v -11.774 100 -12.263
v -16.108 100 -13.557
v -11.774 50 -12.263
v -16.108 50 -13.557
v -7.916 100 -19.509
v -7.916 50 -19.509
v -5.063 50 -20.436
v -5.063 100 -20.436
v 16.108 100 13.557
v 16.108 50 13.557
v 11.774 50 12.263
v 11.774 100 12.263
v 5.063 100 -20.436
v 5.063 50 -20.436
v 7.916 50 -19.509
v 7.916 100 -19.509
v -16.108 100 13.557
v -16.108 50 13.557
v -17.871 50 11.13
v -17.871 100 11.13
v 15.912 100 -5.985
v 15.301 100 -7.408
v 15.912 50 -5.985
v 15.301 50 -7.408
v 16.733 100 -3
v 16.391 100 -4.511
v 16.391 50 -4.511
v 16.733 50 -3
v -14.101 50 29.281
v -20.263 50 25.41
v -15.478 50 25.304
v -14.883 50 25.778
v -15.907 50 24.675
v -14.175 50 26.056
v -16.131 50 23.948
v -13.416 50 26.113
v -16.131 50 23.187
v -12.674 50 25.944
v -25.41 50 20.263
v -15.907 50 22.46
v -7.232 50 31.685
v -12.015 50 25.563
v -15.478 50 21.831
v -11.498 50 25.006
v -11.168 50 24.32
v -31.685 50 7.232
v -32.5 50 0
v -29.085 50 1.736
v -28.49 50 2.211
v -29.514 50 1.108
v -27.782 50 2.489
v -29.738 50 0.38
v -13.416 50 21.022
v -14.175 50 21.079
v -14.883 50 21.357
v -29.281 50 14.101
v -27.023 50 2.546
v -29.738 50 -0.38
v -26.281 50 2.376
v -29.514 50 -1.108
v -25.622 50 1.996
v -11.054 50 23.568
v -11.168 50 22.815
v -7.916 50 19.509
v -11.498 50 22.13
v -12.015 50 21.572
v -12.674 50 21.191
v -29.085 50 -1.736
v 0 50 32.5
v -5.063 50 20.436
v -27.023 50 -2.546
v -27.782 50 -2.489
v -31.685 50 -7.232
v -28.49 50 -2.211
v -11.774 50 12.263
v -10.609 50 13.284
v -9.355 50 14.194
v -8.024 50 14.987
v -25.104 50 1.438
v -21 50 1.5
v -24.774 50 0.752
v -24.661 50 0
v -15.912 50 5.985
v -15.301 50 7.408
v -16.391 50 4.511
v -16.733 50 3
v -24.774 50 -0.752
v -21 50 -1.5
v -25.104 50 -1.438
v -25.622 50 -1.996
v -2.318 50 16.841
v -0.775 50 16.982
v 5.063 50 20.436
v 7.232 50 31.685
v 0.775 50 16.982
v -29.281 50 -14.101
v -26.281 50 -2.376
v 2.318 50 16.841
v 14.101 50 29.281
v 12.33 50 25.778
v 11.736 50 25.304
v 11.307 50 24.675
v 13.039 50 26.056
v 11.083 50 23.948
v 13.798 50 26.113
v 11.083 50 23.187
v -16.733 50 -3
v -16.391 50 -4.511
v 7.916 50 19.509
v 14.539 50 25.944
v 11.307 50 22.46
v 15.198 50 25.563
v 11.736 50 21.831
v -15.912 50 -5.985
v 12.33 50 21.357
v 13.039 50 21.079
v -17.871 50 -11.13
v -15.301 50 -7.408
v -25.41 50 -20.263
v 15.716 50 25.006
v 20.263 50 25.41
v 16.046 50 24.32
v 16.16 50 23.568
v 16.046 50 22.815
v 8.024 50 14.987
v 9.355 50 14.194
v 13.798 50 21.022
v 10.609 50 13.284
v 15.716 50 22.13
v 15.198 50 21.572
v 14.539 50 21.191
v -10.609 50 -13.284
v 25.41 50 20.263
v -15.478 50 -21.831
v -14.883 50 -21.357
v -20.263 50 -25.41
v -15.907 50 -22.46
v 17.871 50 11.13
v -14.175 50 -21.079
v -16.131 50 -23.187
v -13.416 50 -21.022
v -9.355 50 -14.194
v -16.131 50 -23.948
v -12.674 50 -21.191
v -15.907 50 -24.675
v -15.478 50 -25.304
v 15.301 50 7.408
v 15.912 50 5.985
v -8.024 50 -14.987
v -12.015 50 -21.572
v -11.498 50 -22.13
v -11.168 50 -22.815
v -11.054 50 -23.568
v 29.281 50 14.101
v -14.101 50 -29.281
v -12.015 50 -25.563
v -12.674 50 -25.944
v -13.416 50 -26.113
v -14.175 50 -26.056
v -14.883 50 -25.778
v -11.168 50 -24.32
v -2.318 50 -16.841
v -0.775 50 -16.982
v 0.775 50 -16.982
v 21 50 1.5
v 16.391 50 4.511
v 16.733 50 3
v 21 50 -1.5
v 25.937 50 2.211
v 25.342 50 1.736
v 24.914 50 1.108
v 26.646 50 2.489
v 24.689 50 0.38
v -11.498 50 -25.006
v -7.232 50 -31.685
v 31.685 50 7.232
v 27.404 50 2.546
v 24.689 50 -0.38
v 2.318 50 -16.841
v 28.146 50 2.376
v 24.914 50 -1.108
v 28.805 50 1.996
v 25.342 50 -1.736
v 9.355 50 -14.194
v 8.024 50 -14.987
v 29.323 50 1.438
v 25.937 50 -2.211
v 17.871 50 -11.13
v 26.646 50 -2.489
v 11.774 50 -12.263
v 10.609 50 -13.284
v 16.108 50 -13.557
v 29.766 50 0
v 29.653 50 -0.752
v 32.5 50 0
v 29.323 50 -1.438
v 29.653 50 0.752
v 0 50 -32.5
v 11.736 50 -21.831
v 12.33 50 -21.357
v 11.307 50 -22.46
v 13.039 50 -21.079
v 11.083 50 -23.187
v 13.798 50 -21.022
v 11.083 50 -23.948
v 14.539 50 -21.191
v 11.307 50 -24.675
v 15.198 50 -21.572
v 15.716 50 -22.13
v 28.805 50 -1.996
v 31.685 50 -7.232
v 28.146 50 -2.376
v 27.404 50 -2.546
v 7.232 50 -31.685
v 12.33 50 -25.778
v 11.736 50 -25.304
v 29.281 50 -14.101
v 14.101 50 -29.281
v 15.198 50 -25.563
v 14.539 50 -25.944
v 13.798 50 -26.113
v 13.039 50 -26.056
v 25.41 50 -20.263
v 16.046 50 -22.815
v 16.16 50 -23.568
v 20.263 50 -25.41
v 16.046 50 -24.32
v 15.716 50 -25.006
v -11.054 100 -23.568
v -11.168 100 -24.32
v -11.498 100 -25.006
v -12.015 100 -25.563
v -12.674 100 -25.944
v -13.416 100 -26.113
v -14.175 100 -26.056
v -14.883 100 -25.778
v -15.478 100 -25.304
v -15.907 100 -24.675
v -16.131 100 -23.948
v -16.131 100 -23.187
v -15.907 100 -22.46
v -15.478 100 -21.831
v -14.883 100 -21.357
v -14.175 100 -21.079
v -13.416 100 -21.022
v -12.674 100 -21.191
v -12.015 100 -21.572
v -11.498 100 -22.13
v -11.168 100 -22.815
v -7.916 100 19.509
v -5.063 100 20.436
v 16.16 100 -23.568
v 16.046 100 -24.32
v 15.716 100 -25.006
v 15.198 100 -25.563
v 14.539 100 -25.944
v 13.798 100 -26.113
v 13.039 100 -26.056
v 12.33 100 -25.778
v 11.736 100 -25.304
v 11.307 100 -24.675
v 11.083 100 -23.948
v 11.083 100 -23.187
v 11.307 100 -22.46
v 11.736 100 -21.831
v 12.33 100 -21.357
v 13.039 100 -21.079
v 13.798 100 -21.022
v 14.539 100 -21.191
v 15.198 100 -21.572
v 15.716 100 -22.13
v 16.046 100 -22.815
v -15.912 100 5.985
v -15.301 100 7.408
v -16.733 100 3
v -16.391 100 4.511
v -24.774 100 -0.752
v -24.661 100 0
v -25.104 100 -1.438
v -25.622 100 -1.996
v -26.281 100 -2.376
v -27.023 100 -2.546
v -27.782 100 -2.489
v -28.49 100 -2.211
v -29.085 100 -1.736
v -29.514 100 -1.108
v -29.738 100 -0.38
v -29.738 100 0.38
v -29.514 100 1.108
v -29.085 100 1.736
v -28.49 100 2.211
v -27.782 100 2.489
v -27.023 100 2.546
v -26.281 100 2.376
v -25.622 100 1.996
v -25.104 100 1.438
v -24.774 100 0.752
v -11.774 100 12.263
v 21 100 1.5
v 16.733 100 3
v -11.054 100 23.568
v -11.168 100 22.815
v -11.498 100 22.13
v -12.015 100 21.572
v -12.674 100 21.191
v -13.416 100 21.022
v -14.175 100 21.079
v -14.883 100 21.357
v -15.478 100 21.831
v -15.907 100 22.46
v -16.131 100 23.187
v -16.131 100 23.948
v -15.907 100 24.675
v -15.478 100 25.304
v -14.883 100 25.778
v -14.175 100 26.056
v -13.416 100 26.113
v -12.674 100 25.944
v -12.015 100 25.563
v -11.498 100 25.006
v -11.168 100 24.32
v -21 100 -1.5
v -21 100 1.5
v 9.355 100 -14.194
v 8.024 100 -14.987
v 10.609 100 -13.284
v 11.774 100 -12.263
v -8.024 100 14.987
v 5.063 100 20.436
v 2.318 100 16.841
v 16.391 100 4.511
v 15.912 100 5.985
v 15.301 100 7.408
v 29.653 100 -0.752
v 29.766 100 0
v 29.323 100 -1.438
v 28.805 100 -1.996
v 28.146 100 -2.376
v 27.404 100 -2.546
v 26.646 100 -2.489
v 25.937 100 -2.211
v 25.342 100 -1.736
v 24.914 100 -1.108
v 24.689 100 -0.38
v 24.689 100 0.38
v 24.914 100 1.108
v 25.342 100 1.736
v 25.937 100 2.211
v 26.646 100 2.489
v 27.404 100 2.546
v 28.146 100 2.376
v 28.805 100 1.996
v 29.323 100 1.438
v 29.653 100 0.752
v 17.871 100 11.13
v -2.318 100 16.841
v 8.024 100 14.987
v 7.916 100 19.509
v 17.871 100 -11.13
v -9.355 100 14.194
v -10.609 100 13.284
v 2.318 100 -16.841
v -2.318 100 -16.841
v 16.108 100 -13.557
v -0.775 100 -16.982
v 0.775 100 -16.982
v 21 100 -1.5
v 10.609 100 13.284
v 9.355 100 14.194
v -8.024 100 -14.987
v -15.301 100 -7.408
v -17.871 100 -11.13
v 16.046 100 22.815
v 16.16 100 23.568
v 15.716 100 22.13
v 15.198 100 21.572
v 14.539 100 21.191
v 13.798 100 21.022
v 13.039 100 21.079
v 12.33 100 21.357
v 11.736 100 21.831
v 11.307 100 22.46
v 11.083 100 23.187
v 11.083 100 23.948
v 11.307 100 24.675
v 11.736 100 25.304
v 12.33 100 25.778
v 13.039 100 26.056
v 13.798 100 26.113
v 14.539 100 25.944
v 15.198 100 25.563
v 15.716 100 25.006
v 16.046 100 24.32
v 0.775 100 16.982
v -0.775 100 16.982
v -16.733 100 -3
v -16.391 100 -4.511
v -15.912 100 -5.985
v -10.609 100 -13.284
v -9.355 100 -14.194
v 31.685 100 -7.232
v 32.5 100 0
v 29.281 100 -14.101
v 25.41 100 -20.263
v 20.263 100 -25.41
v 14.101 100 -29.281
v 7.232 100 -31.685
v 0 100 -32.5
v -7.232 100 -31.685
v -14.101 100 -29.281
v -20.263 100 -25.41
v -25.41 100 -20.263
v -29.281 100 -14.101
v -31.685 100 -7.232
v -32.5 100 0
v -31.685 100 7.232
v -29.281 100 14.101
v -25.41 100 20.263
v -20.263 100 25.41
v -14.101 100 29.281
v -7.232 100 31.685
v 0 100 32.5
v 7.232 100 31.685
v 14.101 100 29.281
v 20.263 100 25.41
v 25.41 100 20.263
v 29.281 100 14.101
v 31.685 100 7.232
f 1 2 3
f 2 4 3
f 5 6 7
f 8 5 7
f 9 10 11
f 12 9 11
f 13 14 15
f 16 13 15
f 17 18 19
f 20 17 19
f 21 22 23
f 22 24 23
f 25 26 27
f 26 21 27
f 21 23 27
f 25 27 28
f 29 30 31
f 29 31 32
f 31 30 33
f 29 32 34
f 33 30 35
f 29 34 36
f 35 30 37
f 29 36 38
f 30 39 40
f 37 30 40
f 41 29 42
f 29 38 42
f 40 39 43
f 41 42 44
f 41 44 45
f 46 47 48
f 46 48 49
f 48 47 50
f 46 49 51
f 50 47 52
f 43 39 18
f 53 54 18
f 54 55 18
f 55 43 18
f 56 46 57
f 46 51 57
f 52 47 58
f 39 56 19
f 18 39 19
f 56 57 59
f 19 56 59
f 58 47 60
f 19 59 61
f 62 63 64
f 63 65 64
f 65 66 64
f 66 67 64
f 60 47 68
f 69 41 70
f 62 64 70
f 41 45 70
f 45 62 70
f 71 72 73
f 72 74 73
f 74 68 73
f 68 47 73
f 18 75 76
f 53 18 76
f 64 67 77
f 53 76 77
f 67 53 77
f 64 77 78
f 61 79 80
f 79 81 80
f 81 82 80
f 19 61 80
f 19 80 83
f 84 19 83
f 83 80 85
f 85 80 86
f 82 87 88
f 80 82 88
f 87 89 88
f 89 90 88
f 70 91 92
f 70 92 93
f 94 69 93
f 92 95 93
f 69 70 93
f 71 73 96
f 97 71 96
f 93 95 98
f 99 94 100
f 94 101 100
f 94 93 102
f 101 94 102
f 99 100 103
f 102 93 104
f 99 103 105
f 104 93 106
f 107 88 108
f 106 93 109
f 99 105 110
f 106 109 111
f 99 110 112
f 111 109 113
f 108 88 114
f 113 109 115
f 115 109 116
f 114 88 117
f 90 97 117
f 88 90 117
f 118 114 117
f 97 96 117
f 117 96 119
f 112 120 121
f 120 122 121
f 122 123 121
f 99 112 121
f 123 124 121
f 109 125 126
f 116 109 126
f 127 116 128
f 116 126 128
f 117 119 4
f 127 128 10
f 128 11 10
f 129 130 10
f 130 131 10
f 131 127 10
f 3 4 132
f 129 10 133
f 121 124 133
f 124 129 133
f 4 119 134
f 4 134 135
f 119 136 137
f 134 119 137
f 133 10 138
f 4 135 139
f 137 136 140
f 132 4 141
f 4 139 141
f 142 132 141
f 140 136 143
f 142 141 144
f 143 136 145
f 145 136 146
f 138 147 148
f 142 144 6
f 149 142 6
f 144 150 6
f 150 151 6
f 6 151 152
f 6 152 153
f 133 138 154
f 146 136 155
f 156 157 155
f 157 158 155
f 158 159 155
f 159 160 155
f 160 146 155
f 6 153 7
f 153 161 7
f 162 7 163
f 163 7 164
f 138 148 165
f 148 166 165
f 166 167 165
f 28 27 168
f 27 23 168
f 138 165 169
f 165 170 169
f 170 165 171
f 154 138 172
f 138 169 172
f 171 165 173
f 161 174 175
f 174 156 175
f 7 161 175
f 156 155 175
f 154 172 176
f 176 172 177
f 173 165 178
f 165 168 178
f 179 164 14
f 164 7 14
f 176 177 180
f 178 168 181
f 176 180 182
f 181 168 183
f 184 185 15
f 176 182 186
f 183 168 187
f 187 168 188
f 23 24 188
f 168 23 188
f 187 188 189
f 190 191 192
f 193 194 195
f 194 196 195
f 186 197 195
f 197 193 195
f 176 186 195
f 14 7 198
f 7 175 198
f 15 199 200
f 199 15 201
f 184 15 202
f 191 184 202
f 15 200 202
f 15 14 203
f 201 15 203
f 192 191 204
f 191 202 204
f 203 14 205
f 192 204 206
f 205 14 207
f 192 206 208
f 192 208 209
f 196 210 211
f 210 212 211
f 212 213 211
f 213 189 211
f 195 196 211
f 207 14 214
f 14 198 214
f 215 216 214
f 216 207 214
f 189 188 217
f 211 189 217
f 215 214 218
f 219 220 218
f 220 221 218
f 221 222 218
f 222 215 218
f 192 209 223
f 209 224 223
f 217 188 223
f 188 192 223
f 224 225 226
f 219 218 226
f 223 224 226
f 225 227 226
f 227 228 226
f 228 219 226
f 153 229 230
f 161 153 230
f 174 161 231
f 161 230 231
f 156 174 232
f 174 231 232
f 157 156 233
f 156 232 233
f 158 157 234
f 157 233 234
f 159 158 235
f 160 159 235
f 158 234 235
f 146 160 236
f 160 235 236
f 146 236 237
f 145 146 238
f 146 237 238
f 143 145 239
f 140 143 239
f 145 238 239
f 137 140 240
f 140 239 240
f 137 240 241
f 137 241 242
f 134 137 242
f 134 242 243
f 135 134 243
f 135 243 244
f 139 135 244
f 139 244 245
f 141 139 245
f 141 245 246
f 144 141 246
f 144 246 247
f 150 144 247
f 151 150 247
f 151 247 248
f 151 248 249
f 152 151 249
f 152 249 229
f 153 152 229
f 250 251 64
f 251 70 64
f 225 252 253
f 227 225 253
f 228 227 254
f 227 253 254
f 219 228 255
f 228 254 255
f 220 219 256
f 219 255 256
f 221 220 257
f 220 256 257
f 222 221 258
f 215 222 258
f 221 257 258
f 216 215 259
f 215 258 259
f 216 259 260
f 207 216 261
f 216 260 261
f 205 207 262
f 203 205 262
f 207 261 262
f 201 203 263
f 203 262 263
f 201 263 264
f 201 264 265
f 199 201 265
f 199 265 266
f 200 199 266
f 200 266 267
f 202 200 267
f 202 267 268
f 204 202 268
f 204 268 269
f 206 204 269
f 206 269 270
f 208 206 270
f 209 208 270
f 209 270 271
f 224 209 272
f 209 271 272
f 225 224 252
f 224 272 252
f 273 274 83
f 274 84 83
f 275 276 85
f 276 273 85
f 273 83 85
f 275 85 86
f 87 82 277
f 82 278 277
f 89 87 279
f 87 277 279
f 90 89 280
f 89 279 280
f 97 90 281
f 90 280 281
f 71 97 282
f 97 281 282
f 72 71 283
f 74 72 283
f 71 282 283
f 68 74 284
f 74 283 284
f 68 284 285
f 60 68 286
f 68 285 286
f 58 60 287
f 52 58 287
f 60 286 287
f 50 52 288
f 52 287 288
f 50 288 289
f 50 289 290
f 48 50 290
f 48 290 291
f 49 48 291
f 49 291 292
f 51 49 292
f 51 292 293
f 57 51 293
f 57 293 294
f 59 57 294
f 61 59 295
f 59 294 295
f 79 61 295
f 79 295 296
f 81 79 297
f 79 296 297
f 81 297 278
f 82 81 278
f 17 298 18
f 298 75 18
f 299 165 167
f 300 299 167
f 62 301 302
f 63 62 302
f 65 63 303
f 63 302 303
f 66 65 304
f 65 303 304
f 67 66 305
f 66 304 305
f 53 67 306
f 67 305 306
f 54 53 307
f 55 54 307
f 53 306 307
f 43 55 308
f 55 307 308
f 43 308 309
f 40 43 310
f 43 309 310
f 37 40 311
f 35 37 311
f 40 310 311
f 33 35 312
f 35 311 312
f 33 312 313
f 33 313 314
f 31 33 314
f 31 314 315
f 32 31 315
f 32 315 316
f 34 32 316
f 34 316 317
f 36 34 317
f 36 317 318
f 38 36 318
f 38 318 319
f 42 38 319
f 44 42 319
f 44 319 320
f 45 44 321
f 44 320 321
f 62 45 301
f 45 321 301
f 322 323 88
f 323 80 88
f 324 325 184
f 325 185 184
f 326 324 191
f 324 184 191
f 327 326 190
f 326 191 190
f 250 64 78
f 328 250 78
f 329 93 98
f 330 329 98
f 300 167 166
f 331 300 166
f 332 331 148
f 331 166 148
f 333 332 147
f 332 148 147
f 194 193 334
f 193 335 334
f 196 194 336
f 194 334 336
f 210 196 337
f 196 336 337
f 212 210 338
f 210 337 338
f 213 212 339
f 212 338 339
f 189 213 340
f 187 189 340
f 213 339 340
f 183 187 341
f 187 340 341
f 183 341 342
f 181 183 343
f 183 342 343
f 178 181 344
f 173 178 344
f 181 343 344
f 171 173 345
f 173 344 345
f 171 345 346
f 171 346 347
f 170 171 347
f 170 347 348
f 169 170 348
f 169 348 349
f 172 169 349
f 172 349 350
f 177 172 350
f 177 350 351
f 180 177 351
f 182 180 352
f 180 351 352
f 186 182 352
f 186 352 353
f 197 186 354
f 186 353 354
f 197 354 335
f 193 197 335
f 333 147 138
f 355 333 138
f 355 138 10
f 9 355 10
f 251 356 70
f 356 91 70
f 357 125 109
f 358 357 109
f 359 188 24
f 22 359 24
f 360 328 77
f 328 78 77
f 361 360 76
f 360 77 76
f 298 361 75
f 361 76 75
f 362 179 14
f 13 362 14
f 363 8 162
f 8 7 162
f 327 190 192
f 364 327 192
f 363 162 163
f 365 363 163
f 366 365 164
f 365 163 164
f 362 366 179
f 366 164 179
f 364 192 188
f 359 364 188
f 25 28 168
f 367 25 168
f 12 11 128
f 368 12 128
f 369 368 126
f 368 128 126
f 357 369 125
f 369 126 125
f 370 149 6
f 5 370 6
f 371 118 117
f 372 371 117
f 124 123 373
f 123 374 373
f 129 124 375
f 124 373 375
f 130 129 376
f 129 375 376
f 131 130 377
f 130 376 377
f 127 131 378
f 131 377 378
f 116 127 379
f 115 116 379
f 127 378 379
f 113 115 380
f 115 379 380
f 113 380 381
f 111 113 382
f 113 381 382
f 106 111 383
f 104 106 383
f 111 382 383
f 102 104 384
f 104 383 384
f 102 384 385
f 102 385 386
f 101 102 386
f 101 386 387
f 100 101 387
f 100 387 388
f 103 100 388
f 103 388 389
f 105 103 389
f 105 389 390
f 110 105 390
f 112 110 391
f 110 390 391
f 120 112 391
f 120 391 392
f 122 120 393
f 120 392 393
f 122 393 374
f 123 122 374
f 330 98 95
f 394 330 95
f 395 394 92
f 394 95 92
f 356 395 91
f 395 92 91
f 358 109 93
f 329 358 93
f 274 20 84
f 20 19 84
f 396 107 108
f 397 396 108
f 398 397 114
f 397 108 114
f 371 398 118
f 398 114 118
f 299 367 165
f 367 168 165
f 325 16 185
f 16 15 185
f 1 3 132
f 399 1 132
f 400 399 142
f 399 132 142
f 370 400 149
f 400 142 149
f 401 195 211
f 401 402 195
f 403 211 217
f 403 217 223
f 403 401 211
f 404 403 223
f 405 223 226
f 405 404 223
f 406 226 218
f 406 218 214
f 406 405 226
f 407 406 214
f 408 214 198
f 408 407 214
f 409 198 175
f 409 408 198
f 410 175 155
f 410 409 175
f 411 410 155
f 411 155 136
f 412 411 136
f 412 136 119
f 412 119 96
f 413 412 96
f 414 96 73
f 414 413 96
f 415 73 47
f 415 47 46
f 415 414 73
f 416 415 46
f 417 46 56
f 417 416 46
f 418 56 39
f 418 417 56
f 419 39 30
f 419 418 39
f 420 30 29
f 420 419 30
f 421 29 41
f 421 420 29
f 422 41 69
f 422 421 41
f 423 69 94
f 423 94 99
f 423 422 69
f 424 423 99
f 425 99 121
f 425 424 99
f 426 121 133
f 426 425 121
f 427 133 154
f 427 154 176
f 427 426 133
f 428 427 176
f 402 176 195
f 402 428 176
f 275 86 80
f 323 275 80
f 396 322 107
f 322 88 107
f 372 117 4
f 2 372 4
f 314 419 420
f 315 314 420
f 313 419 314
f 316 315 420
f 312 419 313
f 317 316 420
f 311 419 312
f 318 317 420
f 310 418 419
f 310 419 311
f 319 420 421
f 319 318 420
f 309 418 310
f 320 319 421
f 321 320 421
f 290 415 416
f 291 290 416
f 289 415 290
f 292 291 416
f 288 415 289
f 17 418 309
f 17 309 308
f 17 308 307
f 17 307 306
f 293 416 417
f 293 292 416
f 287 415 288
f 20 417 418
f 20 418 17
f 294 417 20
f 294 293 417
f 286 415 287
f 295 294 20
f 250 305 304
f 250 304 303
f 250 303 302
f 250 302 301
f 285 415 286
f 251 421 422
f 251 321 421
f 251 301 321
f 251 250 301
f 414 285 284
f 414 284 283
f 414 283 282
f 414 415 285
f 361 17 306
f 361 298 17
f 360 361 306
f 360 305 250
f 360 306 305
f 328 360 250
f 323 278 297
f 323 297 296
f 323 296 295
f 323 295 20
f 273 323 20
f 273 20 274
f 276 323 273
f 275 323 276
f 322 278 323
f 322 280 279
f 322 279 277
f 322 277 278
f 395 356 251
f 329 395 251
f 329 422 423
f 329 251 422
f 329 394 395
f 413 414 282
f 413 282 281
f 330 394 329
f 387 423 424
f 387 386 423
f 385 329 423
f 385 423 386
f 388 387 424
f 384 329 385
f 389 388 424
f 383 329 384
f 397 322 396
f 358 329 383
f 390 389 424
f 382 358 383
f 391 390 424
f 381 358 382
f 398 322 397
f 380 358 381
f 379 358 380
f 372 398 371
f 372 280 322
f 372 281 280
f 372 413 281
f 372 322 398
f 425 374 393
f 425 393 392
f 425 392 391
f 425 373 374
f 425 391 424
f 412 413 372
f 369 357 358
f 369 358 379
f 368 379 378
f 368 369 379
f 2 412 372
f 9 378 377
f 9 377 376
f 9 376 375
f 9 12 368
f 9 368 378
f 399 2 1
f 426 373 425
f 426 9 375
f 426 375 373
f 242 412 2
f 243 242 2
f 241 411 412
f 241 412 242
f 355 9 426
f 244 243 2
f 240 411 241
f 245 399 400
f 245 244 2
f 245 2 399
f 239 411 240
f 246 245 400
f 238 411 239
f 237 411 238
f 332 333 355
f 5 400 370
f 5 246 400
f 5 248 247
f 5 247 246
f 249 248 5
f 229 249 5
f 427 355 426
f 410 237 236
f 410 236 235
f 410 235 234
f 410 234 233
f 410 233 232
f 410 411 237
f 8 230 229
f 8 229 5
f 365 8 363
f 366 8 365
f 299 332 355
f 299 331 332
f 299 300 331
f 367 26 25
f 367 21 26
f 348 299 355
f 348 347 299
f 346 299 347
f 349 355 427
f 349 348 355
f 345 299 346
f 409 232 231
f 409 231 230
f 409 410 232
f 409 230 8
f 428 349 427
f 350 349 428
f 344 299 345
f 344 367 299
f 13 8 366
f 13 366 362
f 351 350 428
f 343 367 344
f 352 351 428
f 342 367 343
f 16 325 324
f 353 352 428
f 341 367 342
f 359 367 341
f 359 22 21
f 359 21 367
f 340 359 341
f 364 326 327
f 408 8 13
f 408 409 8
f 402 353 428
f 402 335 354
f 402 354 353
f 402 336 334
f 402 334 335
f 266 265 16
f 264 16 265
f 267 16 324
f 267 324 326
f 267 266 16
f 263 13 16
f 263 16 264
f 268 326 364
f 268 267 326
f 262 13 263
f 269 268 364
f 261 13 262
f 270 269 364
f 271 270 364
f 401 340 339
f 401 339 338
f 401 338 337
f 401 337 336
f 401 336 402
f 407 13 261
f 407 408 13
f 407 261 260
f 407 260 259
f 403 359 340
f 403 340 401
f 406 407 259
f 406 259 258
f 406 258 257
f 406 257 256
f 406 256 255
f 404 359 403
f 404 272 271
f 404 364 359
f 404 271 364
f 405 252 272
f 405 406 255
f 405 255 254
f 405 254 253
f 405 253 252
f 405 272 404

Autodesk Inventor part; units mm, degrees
ref_plane "YZ Plane" through (0, 0, 0) normal (1, 0, 0) x (0, 1, 0)
ref_plane "XZ Plane" through (0, 0, 0) normal (0, 1, 0) x (-1, 0, 0)
ref_plane "XY Plane" through (0, 0, 0) normal (0, 0, 1) x (1, 0, 0)
sketch "Sketch1" plane through (0, 0, 0) normal (0, 1, 0) x (-1, 0, 0)
  circle A0 centre (0, 0) radius 17
  line L0 (16.7332, -3) -> (21, -1.5)
  line L1 (21, -1.5) -> (21, 1.5)
  line L2 (21, 1.5) -> (16.7332, 3)
  line L3 (15.3008, 7.4085) -> (17.871, 11.13)
  line L4 (17.871, 11.13) -> (16.1077, 13.557)
  line L5 (16.1077, 13.557) -> (11.7741, 12.2626)
  line L6 (8.024, 14.9872) -> (7.9159, 19.5087)
  line L7 (7.9159, 19.5087) -> (5.0628, 20.4357)
  line L8 (5.0628, 20.4357) -> (2.3177, 16.8413)
  line L9 (-2.3177, 16.8413) -> (-5.0628, 20.4357)
  line L10 (-5.0628, 20.4357) -> (-7.9159, 19.5087)
  line L11 (-7.9159, 19.5087) -> (-8.024, 14.9872)
  line L12 (-11.7741, 12.2626) -> (-16.1077, 13.557)
  line L13 (-16.1077, 13.557) -> (-17.871, 11.13)
  line L14 (-17.871, 11.13) -> (-15.3008, 7.4085)
  line L15 (-16.7332, 3) -> (-21, 1.5)
  line L16 (-21, 1.5) -> (-21, -1.5)
  line L17 (-21, -1.5) -> (-16.7332, -3)
  line L18 (-15.3008, -7.4085) -> (-17.871, -11.13)
  line L19 (-17.871, -11.13) -> (-16.1077, -13.557)
  line L20 (-16.1077, -13.557) -> (-11.7741, -12.2626)
  line L21 (-8.024, -14.9872) -> (-7.9159, -19.5087)
  line L22 (-7.9159, -19.5087) -> (-5.0628, -20.4357)
  line L23 (-5.0628, -20.4357) -> (-2.3177, -16.8413)
  line L24 (2.3177, -16.8413) -> (5.0628, -20.4357)
  line L25 (5.0628, -20.4357) -> (7.9159, -19.5087)
  line L26 (7.9159, -19.5087) -> (8.024, -14.9872)
  line L27 (11.7741, -12.2626) -> (16.1077, -13.557)
  line L28 (16.1077, -13.557) -> (17.871, -11.13)
  line L29 (17.871, -11.13) -> (15.3008, -7.4085)
  dimension "d0" = 34
  dimension "d1" = 3
  dimension "d2" = 6
  dimension "d3" = 4
  dimension "d4" = 109.369
  dimension "d5" = 109.369
  dimension "d8" = 360
extrude "Extrusion1" add sketch "Sketch1" along normal blind 5
sketch "Sketch2" plane through (0, 5, 0) normal (0, 1, 0) x (1, 0, 0)
  line L0 (-15.3008, -7.4085) -> (-17.871, -11.13) projected
  line L1 (-17.871, -11.13) -> (-16.1077, -13.557) projected
  line L2 (-16.1077, -13.557) -> (-11.7741, -12.2626) projected
  arc A0 (-11.7741, -12.2626) -> (-8.024, -14.9872) centre (0, 0) ccw projected
  line L3 (-8.024, -14.9872) -> (-7.9159, -19.5087) projected
  line L4 (-7.9159, -19.5087) -> (-5.0628, -20.4357) projected
  line L5 (-5.0628, -20.4357) -> (-2.3177, -16.8413) projected
  arc A1 (-2.3177, -16.8413) -> (2.3177, -16.8413) centre (0, 0) ccw projected
  line L6 (2.3177, -16.8413) -> (5.0628, -20.4357) projected
  line L7 (5.0628, -20.4357) -> (7.9159, -19.5087) projected
  line L8 (7.9159, -19.5087) -> (8.024, -14.9872) projected
  arc A2 (8.024, -14.9872) -> (11.7741, -12.2626) centre (0, 0) ccw projected
  line L9 (11.7741, -12.2626) -> (16.1077, -13.557) projected
  line L10 (16.1077, -13.557) -> (17.871, -11.13) projected
  line L11 (17.871, -11.13) -> (15.3008, -7.4085) projected
  arc A3 (15.3008, -7.4085) -> (16.7332, -3) centre (0, 0) ccw projected
  line L12 (16.7332, -3) -> (21, -1.5) projected
  line L13 (21, -1.5) -> (21, 1.5) projected
  line L14 (21, 1.5) -> (16.7332, 3) projected
  arc A4 (16.7332, 3) -> (15.3008, 7.4085) centre (0, 0) ccw projected
  line L15 (15.3008, 7.4085) -> (17.871, 11.13) projected
  line L16 (17.871, 11.13) -> (16.1077, 13.557) projected
  line L17 (16.1077, 13.557) -> (11.7741, 12.2626) projected
  arc A5 (11.7741, 12.2626) -> (8.024, 14.9872) centre (0, 0) ccw projected
  line L18 (8.024, 14.9872) -> (7.9159, 19.5087) projected
  line L19 (7.9159, 19.5087) -> (5.0628, 20.4357) projected
  line L20 (5.0628, 20.4357) -> (2.3177, 16.8413) projected
  arc A6 (2.3177, 16.8413) -> (-2.3177, 16.8413) centre (0, 0) ccw projected
  line L21 (-2.3177, 16.8413) -> (-5.0628, 20.4357) projected
  line L22 (-5.0628, 20.4357) -> (-7.9159, 19.5087) projected
  line L23 (-7.9159, 19.5087) -> (-8.024, 14.9872) projected
  arc A7 (-8.024, 14.9872) -> (-11.7741, 12.2626) centre (0, 0) ccw projected
  line L24 (-11.7741, 12.2626) -> (-16.1077, 13.557) projected
  line L25 (-16.1077, 13.557) -> (-17.871, 11.13) projected
  line L26 (-17.871, 11.13) -> (-15.3008, 7.4085) projected
  arc A8 (-15.3008, 7.4085) -> (-16.7332, 3) centre (0, 0) ccw projected
  line L27 (-16.7332, 3) -> (-21, 1.5) projected
  line L28 (-21, 1.5) -> (-21, -1.5) projected
  line L29 (-21, -1.5) -> (-16.7332, -3) projected
  arc A9 (-16.7332, -3) -> (-15.3008, -7.4085) centre (0, 0) ccw projected
extrude "Extrusion2" add sketch "Sketch2" along normal blind 500
sketch "Sketch3" plane through (0, 505, 0) normal (0, 1, 0) x (1, 0, 0)
  circle A0 centre (0, 0) radius 4
  dimension "d14" = 8
extrude "Extrusion3" cut sketch "Sketch3" against normal blind 528.7
sketch "Sketch4" plane through (0, 505, 0) normal (0, 1, 0) x (1, 0, 0)
  circle A0 centre (0, 0) radius 4 projected
  line L0 (-17.871, -11.13) -> (-16.1077, -13.557) projected
  line L1 (-16.1077, -13.557) -> (-11.7741, -12.2626) projected
  arc A1 (-11.7741, -12.2626) -> (-8.024, -14.9872) centre (0, 0) ccw projected
  line L2 (-8.024, -14.9872) -> (-7.9159, -19.5087) projected
  line L3 (-7.9159, -19.5087) -> (-5.0628, -20.4357) projected
  line L4 (-5.0628, -20.4357) -> (-2.3177, -16.8413) projected
  arc A2 (-2.3177, -16.8413) -> (2.3177, -16.8413) centre (0, 0) ccw projected
  line L5 (2.3177, -16.8413) -> (5.0628, -20.4357) projected
  line L6 (5.0628, -20.4357) -> (7.9159, -19.5087) projected
  line L7 (7.9159, -19.5087) -> (8.024, -14.9872) projected
  arc A3 (8.024, -14.9872) -> (11.7741, -12.2626) centre (0, 0) ccw projected
  line L8 (11.7741, -12.2626) -> (16.1077, -13.557) projected
  line L9 (16.1077, -13.557) -> (17.871, -11.13) projected
  line L10 (17.871, -11.13) -> (15.3008, -7.4085) projected
  arc A4 (15.3008, -7.4085) -> (16.7332, -3) centre (0, 0) ccw projected
  line L11 (16.7332, -3) -> (21, -1.5) projected
  line L12 (21, -1.5) -> (21, 1.5) projected
  line L13 (21, 1.5) -> (16.7332, 3) projected
  arc A5 (16.7332, 3) -> (15.3008, 7.4085) centre (0, 0) ccw projected
  line L14 (15.3008, 7.4085) -> (17.871, 11.13) projected
  line L15 (17.871, 11.13) -> (16.1077, 13.557) projected
  line L16 (16.1077, 13.557) -> (11.7741, 12.2626) projected
  arc A6 (11.7741, 12.2626) -> (8.024, 14.9872) centre (0, 0) ccw projected
  line L17 (8.024, 14.9872) -> (7.9159, 19.5087) projected
  line L18 (7.9159, 19.5087) -> (5.0628, 20.4357) projected
  line L19 (5.0628, 20.4357) -> (2.3177, 16.8413) projected
  arc A7 (2.3177, 16.8413) -> (-2.3177, 16.8413) centre (0, 0) ccw projected
  line L20 (-2.3177, 16.8413) -> (-5.0628, 20.4357) projected
  line L21 (-5.0628, 20.4357) -> (-7.9159, 19.5087) projected
  line L22 (-7.9159, 19.5087) -> (-8.024, 14.9872) projected
  arc A8 (-8.024, 14.9872) -> (-11.7741, 12.2626) centre (0, 0) ccw projected
  line L23 (-11.7741, 12.2626) -> (-16.1077, 13.557) projected
  line L24 (-16.1077, 13.557) -> (-17.871, 11.13) projected
  line L25 (-17.871, 11.13) -> (-15.3008, 7.4085) projected
  arc A9 (-15.3008, 7.4085) -> (-16.7332, 3) centre (0, 0) ccw projected
  line L26 (-16.7332, 3) -> (-21, 1.5) projected
  line L27 (-21, 1.5) -> (-21, -1.5) projected
  line L28 (-21, -1.5) -> (-16.7332, -3) projected
  arc A10 (-16.7332, -3) -> (-15.3008, -7.4085) centre (0, 0) ccw projected
  line L29 (-15.3008, -7.4085) -> (-17.871, -11.13) projected
extrude "Extrusion4" cut sketch "Sketch4" against normal blind 449.2 contours A0 | L29 A10 L28 L27 L26 A9 L25 L24 L23 A8 L22 L21 L20 A7 L19 L18 L17 A6 L16 L15 L14 A5 L13 L12 L11 A4 L10 L9 L8 A3 L7 L6 L5 A2 L4 L3 L2 A1 L1 L0
sketch "Sketch5" plane through (0, 55.8, 0) normal (0, 1, 0) x (1, 0, 0)
  circle A0 centre (0, 0) radius 4 projected
  line L0 (-11.7741, -12.2626) -> (-16.1077, -13.557) projected
  arc A1 (-11.7741, -12.2626) -> (-8.024, -14.9872) centre (0, 0) ccw projected
  line L1 (-7.9159, -19.5087) -> (-8.024, -14.9872) projected
  line L2 (-5.0628, -20.4357) -> (-7.9159, -19.5087) projected
  line L3 (-2.3177, -16.8413) -> (-5.0628, -20.4357) projected
  arc A2 (-2.3177, -16.8413) -> (2.3177, -16.8413) centre (0, 0) ccw projected
  line L4 (5.0628, -20.4357) -> (2.3177, -16.8413) projected
  line L5 (7.9159, -19.5087) -> (5.0628, -20.4357) projected
  line L6 (8.024, -14.9872) -> (7.9159, -19.5087) projected
  arc A3 (8.024, -14.9872) -> (11.7741, -12.2626) centre (0, 0) ccw projected
  line L7 (16.1077, -13.557) -> (11.7741, -12.2626) projected
  line L8 (17.871, -11.13) -> (16.1077, -13.557) projected
  line L9 (15.3008, -7.4085) -> (17.871, -11.13) projected
  arc A4 (15.3008, -7.4085) -> (16.7332, -3) centre (0, 0) ccw projected
  line L10 (21, -1.5) -> (16.7332, -3) projected
  line L11 (21, 1.5) -> (21, -1.5) projected
  line L12 (16.7332, 3) -> (21, 1.5) projected
  arc A5 (16.7332, 3) -> (15.3008, 7.4085) centre (0, 0) ccw projected
  line L13 (17.871, 11.13) -> (15.3008, 7.4085) projected
  line L14 (16.1077, 13.557) -> (17.871, 11.13) projected
  line L15 (11.7741, 12.2626) -> (16.1077, 13.557) projected
  arc A6 (11.7741, 12.2626) -> (8.024, 14.9872) centre (0, 0) ccw projected
  line L16 (7.9159, 19.5087) -> (8.024, 14.9872) projected
  line L17 (5.0628, 20.4357) -> (7.9159, 19.5087) projected
  line L18 (2.3177, 16.8413) -> (5.0628, 20.4357) projected
  arc A7 (2.3177, 16.8413) -> (-2.3177, 16.8413) centre (0, 0) ccw projected
  line L19 (-5.0628, 20.4357) -> (-2.3177, 16.8413) projected
  line L20 (-7.9159, 19.5087) -> (-5.0628, 20.4357) projected
  line L21 (-8.024, 14.9872) -> (-7.9159, 19.5087) projected
  arc A8 (-8.024, 14.9872) -> (-11.7741, 12.2626) centre (0, 0) ccw projected
  line L22 (-16.1077, 13.557) -> (-11.7741, 12.2626) projected
  line L23 (-17.871, 11.13) -> (-16.1077, 13.557) projected
  line L24 (-15.3008, 7.4085) -> (-17.871, 11.13) projected
  arc A9 (-15.3008, 7.4085) -> (-16.7332, 3) centre (0, 0) ccw projected
  line L25 (-21, 1.5) -> (-16.7332, 3) projected
  line L26 (-21, -1.5) -> (-21, 1.5) projected
  line L27 (-16.7332, -3) -> (-21, -1.5) projected
  arc A10 (-16.7332, -3) -> (-15.3008, -7.4085) centre (0, 0) ccw projected
  line L28 (-17.871, -11.13) -> (-15.3008, -7.4085) projected
  line L29 (-16.1077, -13.557) -> (-17.871, -11.13) projected
extrude "Extrusion5" cut sketch "Sketch5" against normal blind 5.8
sketch "Sketch6" plane through (0, 50, 0) normal (0, 1, 0) x (1, 0, 0)
  circle A0 centre (0, 0) radius 45
  line L0 (5.0628, -20.4357) -> (2.3177, -16.8413) projected
  line L1 (7.9159, -19.5087) -> (5.0628, -20.4357) projected
  line L2 (8.024, -14.9872) -> (7.9159, -19.5087) projected
  arc A1 (8.024, -14.9872) -> (11.7741, -12.2626) centre (0, 0) ccw projected
  line L3 (16.1077, -13.557) -> (11.7741, -12.2626) projected
  line L4 (17.871, -11.13) -> (16.1077, -13.557) projected
  line L5 (15.3008, -7.4085) -> (17.871, -11.13) projected
  arc A2 (15.3008, -7.4085) -> (16.7332, -3) centre (0, 0) ccw projected
  line L6 (21, -1.5) -> (16.7332, -3) projected
  line L7 (21, 1.5) -> (21, -1.5) projected
  line L8 (16.7332, 3) -> (21, 1.5) projected
  arc A3 (16.7332, 3) -> (15.3008, 7.4085) centre (0, 0) ccw projected
  line L9 (17.871, 11.13) -> (15.3008, 7.4085) projected
  line L10 (16.1077, 13.557) -> (17.871, 11.13) projected
  line L11 (11.7741, 12.2626) -> (16.1077, 13.557) projected
  arc A4 (11.7741, 12.2626) -> (8.024, 14.9872) centre (0, 0) ccw projected
  line L12 (7.9159, 19.5087) -> (8.024, 14.9872) projected
  line L13 (5.0628, 20.4357) -> (7.9159, 19.5087) projected
  line L14 (2.3177, 16.8413) -> (5.0628, 20.4357) projected
  arc A5 (2.3177, 16.8413) -> (-2.3177, 16.8413) centre (0, 0) ccw projected
  line L15 (-5.0628, 20.4357) -> (-2.3177, 16.8413) projected
  line L16 (-7.9159, 19.5087) -> (-5.0628, 20.4357) projected
  line L17 (-8.024, 14.9872) -> (-7.9159, 19.5087) projected
  arc A6 (-8.024, 14.9872) -> (-11.7741, 12.2626) centre (0, 0) ccw projected
  line L18 (-16.1077, 13.557) -> (-11.7741, 12.2626) projected
  line L19 (-17.871, 11.13) -> (-16.1077, 13.557) projected
  line L20 (-15.3008, 7.4085) -> (-17.871, 11.13) projected
  arc A7 (-15.3008, 7.4085) -> (-16.7332, 3) centre (0, 0) ccw projected
  line L21 (-21, 1.5) -> (-16.7332, 3) projected
  line L22 (-21, -1.5) -> (-21, 1.5) projected
  line L23 (-16.7332, -3) -> (-21, -1.5) projected
  arc A8 (-16.7332, -3) -> (-15.3008, -7.4085) centre (0, 0) ccw projected
  line L24 (-17.871, -11.13) -> (-15.3008, -7.4085) projected
  line L25 (-16.1077, -13.557) -> (-17.871, -11.13) projected
  line L26 (-11.7741, -12.2626) -> (-16.1077, -13.557) projected
  arc A9 (-11.7741, -12.2626) -> (-8.024, -14.9872) centre (0, 0) ccw projected
  line L27 (-7.9159, -19.5087) -> (-8.024, -14.9872) projected
  line L28 (-5.0628, -20.4357) -> (-7.9159, -19.5087) projected
  line L29 (-2.3177, -16.8413) -> (-5.0628, -20.4357) projected
  arc A10 (-2.3177, -16.8413) -> (2.3177, -16.8413) centre (0, 0) ccw projected
  circle A11 centre (0, 0) radius 4 projected
  dimension "d21" = 90
extrude "Extrusion6" add sketch "Sketch6" along normal blind 50 contours A0
sketch "Sketch7" plane through (0, 100, 0) normal (0, 1, 0) x (1, 0, 0)
  circle A0 centre (0, 0) radius 45 projected
  line L0 (8.024, -14.9872) -> (7.9159, -19.5087) projected
  line L1 (7.9159, -19.5087) -> (5.0628, -20.4357) projected
  line L2 (5.0628, -20.4357) -> (2.3177, -16.8413) projected
  arc A1 (-2.3177, -16.8413) -> (2.3177, -16.8413) centre (0, 0) ccw projected
  line L3 (-2.3177, -16.8413) -> (-5.0628, -20.4357) projected
  line L4 (-5.0628, -20.4357) -> (-7.9159, -19.5087) projected
  line L5 (-7.9159, -19.5087) -> (-8.024, -14.9872) projected
  arc A2 (-11.7741, -12.2626) -> (-8.024, -14.9872) centre (0, 0) ccw projected
  line L6 (-11.7741, -12.2626) -> (-16.1077, -13.557) projected
  line L7 (-16.1077, -13.557) -> (-17.871, -11.13) projected
  line L8 (-17.871, -11.13) -> (-15.3008, -7.4085) projected
  arc A3 (-16.7332, -3) -> (-15.3008, -7.4085) centre (0, 0) ccw projected
  line L9 (-16.7332, -3) -> (-21, -1.5) projected
  line L10 (-21, -1.5) -> (-21, 1.5) projected
  line L11 (-21, 1.5) -> (-16.7332, 3) projected
  arc A4 (-15.3008, 7.4085) -> (-16.7332, 3) centre (0, 0) ccw projected
  line L12 (-15.3008, 7.4085) -> (-17.871, 11.13) projected
  line L13 (-17.871, 11.13) -> (-16.1077, 13.557) projected
  line L14 (-16.1077, 13.557) -> (-11.7741, 12.2626) projected
  arc A5 (-8.024, 14.9872) -> (-11.7741, 12.2626) centre (0, 0) ccw projected
  line L15 (-8.024, 14.9872) -> (-7.9159, 19.5087) projected
  line L16 (-7.9159, 19.5087) -> (-5.0628, 20.4357) projected
  line L17 (-5.0628, 20.4357) -> (-2.3177, 16.8413) projected
  arc A6 (2.3177, 16.8413) -> (-2.3177, 16.8413) centre (0, 0) ccw projected
  line L18 (2.3177, 16.8413) -> (5.0628, 20.4357) projected
  line L19 (5.0628, 20.4357) -> (7.9159, 19.5087) projected
  line L20 (7.9159, 19.5087) -> (8.024, 14.9872) projected
  arc A7 (11.7741, 12.2626) -> (8.024, 14.9872) centre (0, 0) ccw projected
  line L21 (11.7741, 12.2626) -> (16.1077, 13.557) projected
  line L22 (16.1077, 13.557) -> (17.871, 11.13) projected
  line L23 (17.871, 11.13) -> (15.3008, 7.4085) projected
  arc A8 (16.7332, 3) -> (15.3008, 7.4085) centre (0, 0) ccw projected
  line L24 (16.7332, 3) -> (21, 1.5) projected
  line L25 (21, 1.5) -> (21, -1.5) projected
  line L26 (21, -1.5) -> (16.7332, -3) projected
  arc A9 (15.3008, -7.4085) -> (16.7332, -3) centre (0, 0) ccw projected
  line L27 (15.3008, -7.4085) -> (17.871, -11.13) projected
  line L28 (17.871, -11.13) -> (16.1077, -13.557) projected
  line L29 (16.1077, -13.557) -> (11.7741, -12.2626) projected
  arc A10 (8.024, -14.9872) -> (11.7741, -12.2626) centre (0, 0) ccw projected
  circle A11 centre (0, 0) radius 32.5
  dimension "d24" = 65
extrude "Extrusion7" cut sketch "Sketch7" against normal blind 75.4125 contours A0
sketch "Sketch8" plane through (0, 0, 0) normal (0, -1, 0) x (1, 0, 0)
  circle A0 centre (0, 0) radius 4 projected
  line L0 (-15.3008, 7.4085) -> (-17.871, 11.13) projected
  arc A1 (-15.3008, 7.4085) -> (-16.7332, 3) centre (0, 0) ccw projected
  line L1 (-21, 1.5) -> (-16.7332, 3) projected
  line L2 (-21, -1.5) -> (-21, 1.5) projected
  line L3 (-16.7332, -3) -> (-21, -1.5) projected
  arc A2 (-16.7332, -3) -> (-15.3008, -7.4085) centre (0, 0) ccw projected
  line L4 (-17.871, -11.13) -> (-15.3008, -7.4085) projected
  line L5 (-16.1077, -13.557) -> (-17.871, -11.13) projected
  line L6 (-11.7741, -12.2626) -> (-16.1077, -13.557) projected
  arc A3 (-11.7741, -12.2626) -> (-8.024, -14.9872) centre (0, 0) ccw projected
  line L7 (-7.9159, -19.5087) -> (-8.024, -14.9872) projected
  line L8 (-5.0628, -20.4357) -> (-7.9159, -19.5087) projected
  line L9 (-2.3177, -16.8413) -> (-5.0628, -20.4357) projected
  arc A4 (-2.3177, -16.8413) -> (2.3177, -16.8413) centre (0, 0) ccw projected
  line L10 (5.0628, -20.4357) -> (2.3177, -16.8413) projected
  line L11 (7.9159, -19.5087) -> (5.0628, -20.4357) projected
  line L12 (8.024, -14.9872) -> (7.9159, -19.5087) projected
  arc A5 (8.024, -14.9872) -> (11.7741, -12.2626) centre (0, 0) ccw projected
  line L13 (16.1077, -13.557) -> (11.7741, -12.2626) projected
  line L14 (17.871, -11.13) -> (16.1077, -13.557) projected
  line L15 (15.3008, -7.4085) -> (17.871, -11.13) projected
  arc A6 (15.3008, -7.4085) -> (16.7332, -3) centre (0, 0) ccw projected
  line L16 (21, -1.5) -> (16.7332, -3) projected
  line L17 (21, 1.5) -> (21, -1.5) projected
  line L18 (16.7332, 3) -> (21, 1.5) projected
  arc A7 (16.7332, 3) -> (15.3008, 7.4085) centre (0, 0) ccw projected
  line L19 (17.871, 11.13) -> (15.3008, 7.4085) projected
  line L20 (16.1077, 13.557) -> (17.871, 11.13) projected
  line L21 (11.7741, 12.2626) -> (16.1077, 13.557) projected
  arc A8 (11.7741, 12.2626) -> (8.024, 14.9872) centre (0, 0) ccw projected
  line L22 (7.9159, 19.5087) -> (8.024, 14.9872) projected
  line L23 (5.0628, 20.4357) -> (7.9159, 19.5087) projected
  line L24 (2.3177, 16.8413) -> (5.0628, 20.4357) projected
  arc A9 (2.3177, 16.8413) -> (-2.3177, 16.8413) centre (0, 0) ccw projected
  line L25 (-5.0628, 20.4357) -> (-2.3177, 16.8413) projected
  line L26 (-7.9159, 19.5087) -> (-5.0628, 20.4357) projected
  line L27 (-8.024, 14.9872) -> (-7.9159, 19.5087) projected
  arc A10 (-8.024, 14.9872) -> (-11.7741, 12.2626) centre (0, 0) ccw projected
  line L28 (-16.1077, 13.557) -> (-11.7741, 12.2626) projected
  line L29 (-17.871, 11.13) -> (-16.1077, 13.557) projected
extrude "Extrusion8" cut sketch "Sketch8" against normal up to surface (50 mm away)
sketch "Sketch9" plane through (0, 100, 0) normal (0, 1, 0) x (1, 0, 0)
  circle A0 centre (-27.2136, 0) radius 2.5527
  circle A1 centre (0, 0) radius 27.2136
  circle A2 centre (-13.6068, -23.5677) radius 2.5527
  circle A3 centre (0, 0) radius 27.2136
  circle A4 centre (13.6068, -23.5677) radius 2.5527
  circle A5 centre (0, 0) radius 27.2136
  circle A6 centre (27.2136, 0) radius 2.5527
  circle A7 centre (0, 0) radius 27.2136
  circle A8 centre (13.6068, 23.5677) radius 2.5527
  circle A9 centre (0, 0) radius 27.2136
  circle A10 centre (-13.6068, 23.5677) radius 2.5527
  circle A11 centre (0, 0) radius 27.2136
  dimension "d29" = 5.1054
  dimension "d32" = 360
extrude "Extrusion9" cut sketch "Sketch9" against normal blind 74.1375 contours A0 A1 | A1 A0 | A10 A1 | A1 A10 | A2 A1 | A1 A2 | A8 A1 | A1 A8 | A4 A1 | A1 A4 | A6 A1 | A1 A6
equation "\"d4\" = d5"
properties part number "Wrist Arm Plates"
